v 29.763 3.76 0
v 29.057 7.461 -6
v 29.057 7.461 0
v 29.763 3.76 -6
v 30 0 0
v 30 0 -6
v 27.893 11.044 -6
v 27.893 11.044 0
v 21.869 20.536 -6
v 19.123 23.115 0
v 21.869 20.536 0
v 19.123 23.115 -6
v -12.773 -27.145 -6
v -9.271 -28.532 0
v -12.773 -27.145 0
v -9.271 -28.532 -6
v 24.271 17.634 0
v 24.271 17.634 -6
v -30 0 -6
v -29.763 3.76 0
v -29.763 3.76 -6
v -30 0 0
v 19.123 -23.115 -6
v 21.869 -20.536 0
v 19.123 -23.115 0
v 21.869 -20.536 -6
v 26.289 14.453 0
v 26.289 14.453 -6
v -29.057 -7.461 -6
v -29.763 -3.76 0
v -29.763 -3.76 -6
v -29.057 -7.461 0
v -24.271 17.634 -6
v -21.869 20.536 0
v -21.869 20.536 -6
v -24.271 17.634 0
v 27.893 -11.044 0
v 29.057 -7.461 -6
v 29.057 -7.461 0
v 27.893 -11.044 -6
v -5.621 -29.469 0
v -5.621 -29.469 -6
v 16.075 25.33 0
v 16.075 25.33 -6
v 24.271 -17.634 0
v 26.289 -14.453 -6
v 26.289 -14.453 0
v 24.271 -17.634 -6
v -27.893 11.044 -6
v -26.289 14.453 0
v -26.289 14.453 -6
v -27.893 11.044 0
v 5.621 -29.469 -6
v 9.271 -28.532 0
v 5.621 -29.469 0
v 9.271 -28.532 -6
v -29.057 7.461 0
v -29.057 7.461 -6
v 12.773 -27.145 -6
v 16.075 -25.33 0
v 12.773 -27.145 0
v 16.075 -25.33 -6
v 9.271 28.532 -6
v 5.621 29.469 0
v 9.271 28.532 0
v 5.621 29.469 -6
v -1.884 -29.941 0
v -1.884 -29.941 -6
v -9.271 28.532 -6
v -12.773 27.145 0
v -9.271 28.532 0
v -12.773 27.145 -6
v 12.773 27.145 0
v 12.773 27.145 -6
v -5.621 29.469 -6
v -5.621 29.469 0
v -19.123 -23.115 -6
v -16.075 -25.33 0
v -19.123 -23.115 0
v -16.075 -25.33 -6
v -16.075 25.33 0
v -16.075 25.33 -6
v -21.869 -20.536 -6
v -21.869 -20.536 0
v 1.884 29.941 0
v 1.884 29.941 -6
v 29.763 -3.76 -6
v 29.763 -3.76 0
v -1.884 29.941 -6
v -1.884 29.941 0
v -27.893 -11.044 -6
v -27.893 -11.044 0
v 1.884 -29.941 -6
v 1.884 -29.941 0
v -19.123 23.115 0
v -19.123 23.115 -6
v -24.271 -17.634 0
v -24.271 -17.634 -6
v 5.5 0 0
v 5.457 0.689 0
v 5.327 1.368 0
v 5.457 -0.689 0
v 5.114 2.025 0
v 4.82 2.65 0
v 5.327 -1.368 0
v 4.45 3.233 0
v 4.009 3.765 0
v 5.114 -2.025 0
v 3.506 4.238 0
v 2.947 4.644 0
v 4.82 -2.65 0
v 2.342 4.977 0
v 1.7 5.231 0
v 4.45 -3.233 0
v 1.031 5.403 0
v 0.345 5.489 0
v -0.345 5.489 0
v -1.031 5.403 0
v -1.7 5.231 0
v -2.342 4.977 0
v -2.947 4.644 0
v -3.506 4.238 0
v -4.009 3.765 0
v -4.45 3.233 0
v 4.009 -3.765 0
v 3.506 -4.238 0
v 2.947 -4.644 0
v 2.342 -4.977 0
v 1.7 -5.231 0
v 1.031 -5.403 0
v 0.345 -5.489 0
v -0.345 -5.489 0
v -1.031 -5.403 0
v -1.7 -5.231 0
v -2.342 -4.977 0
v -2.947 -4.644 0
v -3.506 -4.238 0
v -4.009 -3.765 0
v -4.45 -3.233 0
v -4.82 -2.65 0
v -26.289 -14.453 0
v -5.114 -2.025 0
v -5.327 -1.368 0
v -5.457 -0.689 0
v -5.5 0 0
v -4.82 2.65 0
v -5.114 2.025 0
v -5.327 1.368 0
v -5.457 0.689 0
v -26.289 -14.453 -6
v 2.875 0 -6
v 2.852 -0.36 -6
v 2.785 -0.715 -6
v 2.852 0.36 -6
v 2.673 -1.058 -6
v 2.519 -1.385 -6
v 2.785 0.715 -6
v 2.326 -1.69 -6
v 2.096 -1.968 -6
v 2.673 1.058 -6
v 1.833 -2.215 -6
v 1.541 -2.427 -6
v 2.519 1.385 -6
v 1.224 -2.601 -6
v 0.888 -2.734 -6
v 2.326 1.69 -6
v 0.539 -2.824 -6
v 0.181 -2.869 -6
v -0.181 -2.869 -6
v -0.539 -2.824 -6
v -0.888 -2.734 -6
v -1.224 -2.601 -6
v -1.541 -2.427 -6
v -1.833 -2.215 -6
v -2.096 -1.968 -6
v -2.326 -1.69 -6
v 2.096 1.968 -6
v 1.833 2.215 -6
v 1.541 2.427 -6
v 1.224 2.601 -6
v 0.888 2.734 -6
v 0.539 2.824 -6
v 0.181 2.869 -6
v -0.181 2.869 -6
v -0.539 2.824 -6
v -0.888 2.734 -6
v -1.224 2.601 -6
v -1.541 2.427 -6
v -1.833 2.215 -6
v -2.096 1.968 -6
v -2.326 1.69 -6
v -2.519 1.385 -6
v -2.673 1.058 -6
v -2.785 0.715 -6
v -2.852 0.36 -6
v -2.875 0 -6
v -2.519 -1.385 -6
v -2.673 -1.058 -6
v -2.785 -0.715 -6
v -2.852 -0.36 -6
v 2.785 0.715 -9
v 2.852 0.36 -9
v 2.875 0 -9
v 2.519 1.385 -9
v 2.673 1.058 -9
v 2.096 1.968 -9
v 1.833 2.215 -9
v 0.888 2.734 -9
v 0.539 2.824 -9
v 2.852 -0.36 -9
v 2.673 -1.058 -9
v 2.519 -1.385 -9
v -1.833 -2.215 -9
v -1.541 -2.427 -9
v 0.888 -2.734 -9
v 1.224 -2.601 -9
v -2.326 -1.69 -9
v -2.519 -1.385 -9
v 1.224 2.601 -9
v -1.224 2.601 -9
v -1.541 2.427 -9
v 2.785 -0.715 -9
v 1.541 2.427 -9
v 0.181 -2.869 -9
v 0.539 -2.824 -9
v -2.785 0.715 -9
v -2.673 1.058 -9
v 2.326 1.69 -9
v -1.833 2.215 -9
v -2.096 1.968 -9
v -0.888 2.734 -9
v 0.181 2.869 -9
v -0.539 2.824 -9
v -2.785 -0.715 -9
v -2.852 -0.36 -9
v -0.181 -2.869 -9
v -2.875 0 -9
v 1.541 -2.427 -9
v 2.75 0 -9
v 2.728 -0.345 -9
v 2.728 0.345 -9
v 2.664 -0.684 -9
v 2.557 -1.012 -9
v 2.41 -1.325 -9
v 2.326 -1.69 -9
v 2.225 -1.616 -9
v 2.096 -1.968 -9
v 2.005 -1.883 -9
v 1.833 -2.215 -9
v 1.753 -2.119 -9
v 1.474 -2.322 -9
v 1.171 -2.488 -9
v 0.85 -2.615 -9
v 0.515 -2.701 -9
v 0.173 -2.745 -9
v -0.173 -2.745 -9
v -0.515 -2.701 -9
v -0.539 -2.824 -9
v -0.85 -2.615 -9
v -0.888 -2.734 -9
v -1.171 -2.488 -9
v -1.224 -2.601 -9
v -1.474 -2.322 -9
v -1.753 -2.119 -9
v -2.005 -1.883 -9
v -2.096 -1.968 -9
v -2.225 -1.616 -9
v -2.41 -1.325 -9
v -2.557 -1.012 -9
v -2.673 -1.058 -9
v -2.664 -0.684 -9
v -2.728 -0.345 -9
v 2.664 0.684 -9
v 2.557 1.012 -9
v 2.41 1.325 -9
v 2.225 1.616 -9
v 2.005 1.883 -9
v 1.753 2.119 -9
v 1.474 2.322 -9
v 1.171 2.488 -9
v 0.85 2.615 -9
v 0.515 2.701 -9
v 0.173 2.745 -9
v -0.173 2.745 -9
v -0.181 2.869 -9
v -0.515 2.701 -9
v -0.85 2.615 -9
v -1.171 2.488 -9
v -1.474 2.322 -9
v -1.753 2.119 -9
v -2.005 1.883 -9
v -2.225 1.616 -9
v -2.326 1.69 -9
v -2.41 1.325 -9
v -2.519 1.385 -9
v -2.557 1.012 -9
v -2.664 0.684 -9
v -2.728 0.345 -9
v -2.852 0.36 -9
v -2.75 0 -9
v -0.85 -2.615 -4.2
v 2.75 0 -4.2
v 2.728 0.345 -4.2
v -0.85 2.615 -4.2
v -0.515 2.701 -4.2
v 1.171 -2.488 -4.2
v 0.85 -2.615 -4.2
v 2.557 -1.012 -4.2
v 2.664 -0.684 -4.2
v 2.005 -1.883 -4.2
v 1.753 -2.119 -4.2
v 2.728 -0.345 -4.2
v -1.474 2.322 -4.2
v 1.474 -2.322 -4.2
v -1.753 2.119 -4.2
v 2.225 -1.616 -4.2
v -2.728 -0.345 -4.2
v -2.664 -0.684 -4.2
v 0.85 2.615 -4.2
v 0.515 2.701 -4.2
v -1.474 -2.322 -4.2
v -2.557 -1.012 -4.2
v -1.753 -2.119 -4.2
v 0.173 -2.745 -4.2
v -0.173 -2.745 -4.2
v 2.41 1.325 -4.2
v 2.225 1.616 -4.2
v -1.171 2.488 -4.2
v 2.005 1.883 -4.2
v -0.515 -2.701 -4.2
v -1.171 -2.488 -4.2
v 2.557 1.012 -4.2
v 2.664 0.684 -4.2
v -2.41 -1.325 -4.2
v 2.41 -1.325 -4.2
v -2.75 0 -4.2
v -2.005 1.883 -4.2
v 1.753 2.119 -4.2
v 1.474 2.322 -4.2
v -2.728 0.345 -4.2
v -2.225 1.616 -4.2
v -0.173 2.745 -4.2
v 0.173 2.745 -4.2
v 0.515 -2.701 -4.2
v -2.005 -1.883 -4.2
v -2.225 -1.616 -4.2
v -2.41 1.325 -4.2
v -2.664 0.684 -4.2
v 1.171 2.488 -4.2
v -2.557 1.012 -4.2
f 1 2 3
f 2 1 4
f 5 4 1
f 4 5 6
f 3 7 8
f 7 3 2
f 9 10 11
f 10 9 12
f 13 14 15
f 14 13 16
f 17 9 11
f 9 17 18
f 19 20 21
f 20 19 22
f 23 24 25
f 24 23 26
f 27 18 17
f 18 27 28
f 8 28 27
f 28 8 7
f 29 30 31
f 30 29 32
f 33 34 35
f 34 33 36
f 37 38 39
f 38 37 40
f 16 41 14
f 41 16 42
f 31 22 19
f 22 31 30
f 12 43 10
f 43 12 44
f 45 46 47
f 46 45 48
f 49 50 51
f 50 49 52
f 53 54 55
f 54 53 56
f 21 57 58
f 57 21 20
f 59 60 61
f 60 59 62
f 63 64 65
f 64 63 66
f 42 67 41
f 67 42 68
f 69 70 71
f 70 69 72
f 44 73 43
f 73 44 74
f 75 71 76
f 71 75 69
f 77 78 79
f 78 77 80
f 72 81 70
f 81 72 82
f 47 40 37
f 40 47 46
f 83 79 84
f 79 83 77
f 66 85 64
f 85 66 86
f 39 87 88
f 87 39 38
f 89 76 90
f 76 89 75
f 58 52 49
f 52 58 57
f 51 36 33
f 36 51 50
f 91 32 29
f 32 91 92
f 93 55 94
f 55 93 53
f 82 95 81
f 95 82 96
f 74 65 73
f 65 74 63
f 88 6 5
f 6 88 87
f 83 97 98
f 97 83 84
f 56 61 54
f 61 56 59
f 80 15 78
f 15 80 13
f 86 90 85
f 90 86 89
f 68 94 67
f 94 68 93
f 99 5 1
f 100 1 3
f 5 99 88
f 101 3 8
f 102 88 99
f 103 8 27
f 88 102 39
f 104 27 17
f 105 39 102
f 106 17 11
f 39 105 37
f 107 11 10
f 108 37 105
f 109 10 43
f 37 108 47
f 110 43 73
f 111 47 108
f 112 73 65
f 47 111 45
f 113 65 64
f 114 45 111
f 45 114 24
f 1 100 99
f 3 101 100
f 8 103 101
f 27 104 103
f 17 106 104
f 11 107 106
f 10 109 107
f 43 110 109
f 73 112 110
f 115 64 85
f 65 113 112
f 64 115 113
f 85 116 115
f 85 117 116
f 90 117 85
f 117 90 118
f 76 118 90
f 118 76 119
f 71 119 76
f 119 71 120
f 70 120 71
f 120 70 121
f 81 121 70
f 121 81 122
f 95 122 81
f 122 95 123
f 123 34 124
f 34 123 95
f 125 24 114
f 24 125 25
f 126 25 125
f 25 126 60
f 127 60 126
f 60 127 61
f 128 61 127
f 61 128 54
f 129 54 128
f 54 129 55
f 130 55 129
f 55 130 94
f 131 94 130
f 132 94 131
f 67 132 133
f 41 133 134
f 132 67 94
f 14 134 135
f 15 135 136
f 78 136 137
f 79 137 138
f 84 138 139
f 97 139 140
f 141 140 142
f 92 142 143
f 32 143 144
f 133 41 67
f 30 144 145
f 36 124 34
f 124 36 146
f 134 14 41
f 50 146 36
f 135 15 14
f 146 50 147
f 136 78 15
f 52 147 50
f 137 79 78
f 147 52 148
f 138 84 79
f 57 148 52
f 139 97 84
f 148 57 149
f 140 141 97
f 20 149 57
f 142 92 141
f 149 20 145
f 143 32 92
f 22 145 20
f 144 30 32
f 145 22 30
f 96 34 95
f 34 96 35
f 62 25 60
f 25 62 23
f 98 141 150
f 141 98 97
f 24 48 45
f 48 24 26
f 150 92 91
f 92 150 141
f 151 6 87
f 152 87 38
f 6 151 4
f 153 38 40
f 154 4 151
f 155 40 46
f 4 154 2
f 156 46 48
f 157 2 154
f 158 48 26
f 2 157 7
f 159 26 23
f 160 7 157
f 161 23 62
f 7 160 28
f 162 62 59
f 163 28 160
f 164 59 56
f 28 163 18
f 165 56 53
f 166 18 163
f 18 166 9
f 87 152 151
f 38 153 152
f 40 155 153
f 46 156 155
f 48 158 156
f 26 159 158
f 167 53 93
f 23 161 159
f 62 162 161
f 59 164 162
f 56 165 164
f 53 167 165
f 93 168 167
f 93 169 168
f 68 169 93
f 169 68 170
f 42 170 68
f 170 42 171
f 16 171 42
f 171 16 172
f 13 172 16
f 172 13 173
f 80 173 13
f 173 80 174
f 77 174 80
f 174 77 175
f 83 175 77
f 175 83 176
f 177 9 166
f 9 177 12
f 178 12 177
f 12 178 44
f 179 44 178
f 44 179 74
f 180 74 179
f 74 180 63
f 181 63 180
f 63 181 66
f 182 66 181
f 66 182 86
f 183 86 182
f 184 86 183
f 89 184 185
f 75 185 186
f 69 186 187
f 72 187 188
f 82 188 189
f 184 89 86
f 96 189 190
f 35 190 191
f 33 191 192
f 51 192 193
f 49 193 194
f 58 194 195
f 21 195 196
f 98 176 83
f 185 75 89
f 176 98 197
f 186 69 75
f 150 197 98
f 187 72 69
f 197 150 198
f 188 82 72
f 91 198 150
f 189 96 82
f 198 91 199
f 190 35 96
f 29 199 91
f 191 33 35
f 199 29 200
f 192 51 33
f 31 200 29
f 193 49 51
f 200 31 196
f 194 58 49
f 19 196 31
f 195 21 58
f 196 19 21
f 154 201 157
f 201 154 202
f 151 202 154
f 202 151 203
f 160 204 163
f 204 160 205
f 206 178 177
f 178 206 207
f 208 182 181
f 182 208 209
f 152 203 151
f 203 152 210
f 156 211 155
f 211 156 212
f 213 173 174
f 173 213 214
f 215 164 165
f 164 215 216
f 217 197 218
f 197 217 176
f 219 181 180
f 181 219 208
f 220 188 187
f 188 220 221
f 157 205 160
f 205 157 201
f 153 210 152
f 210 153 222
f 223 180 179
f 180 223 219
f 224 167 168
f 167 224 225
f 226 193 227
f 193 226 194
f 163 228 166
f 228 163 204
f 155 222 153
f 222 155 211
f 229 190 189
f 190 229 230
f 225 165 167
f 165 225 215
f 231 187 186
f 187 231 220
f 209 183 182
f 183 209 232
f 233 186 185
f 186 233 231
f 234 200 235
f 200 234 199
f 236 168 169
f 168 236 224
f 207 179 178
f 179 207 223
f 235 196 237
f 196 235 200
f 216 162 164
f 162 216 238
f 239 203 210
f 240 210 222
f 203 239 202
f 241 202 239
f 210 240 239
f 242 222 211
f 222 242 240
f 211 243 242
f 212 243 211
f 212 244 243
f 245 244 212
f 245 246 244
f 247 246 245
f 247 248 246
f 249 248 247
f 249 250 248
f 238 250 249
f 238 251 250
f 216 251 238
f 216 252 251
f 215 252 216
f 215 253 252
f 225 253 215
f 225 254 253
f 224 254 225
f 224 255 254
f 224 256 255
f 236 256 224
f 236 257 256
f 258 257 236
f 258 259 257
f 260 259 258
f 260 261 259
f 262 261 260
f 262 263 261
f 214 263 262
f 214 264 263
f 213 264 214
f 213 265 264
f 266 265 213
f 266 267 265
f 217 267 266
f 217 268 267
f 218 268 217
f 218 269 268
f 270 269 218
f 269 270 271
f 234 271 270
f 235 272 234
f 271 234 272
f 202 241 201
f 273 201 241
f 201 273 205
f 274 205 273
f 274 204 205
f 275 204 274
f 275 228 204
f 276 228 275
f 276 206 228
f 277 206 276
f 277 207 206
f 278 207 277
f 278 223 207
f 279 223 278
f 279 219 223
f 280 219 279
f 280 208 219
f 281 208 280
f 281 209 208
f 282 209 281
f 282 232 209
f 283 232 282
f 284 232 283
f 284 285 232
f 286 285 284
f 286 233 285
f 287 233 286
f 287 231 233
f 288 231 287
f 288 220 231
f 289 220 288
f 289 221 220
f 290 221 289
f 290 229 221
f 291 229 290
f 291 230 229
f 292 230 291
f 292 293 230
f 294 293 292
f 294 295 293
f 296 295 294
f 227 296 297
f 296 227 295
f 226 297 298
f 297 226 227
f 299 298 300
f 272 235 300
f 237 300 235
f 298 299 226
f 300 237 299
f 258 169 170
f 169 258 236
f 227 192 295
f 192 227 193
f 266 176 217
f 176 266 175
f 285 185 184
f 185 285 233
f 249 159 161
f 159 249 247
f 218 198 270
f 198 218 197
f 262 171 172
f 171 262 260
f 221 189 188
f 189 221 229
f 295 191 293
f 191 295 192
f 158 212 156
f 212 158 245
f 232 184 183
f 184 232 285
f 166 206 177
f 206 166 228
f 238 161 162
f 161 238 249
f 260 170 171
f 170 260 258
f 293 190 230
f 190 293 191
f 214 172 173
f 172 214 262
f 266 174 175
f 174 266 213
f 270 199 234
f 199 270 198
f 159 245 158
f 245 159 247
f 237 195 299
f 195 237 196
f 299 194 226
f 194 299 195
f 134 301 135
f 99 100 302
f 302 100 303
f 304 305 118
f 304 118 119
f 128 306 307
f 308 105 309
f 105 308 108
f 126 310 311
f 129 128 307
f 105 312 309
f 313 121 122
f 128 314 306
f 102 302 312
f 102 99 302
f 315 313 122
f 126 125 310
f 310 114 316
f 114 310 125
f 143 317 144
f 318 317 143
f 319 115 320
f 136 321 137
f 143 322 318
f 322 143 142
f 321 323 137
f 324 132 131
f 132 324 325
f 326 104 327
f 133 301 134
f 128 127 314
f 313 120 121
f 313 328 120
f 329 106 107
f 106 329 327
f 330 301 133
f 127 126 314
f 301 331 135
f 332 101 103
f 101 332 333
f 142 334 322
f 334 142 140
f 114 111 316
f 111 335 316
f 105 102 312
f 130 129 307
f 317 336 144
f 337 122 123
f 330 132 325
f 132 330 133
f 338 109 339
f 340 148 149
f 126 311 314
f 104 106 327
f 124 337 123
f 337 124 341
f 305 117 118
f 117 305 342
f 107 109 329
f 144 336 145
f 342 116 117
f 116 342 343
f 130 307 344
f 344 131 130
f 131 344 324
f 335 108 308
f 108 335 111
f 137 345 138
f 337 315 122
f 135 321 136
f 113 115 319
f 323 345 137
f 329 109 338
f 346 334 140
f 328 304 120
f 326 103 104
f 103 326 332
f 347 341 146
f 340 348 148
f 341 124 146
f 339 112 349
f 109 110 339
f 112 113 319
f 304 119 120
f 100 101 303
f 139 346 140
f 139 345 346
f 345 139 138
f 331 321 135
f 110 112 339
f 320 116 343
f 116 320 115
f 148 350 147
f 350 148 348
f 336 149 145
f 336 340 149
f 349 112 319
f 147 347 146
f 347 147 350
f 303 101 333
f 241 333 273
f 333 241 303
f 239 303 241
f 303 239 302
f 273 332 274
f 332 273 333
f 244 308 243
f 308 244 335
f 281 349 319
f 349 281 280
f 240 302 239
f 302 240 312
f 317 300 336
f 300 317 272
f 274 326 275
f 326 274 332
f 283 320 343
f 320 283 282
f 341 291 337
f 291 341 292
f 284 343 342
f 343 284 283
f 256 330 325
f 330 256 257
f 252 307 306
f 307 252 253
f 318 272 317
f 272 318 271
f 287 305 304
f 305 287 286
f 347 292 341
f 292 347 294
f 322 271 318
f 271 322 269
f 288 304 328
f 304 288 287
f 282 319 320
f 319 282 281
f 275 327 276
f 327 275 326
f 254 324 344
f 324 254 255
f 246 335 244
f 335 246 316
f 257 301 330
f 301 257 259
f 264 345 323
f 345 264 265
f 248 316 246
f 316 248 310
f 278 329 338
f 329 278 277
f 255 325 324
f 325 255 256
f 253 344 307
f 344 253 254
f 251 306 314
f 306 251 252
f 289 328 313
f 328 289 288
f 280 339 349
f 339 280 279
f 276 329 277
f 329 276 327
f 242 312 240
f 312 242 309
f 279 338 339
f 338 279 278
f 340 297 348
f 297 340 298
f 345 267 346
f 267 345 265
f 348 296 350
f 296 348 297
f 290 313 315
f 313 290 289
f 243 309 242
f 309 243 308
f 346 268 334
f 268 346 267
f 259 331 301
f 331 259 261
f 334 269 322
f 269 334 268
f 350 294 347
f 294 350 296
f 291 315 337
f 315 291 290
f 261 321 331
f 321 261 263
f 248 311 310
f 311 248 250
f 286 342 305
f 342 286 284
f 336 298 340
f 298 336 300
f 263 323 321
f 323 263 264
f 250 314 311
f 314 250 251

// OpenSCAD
$fn = 50;

difference() {
	union() {
		translate(v = [0, 0, -6.0]) {
			cylinder(h = 6, r = 30.0);
		}
		#translate(v = [0, 0, -9.0]) {
			cylinder(h = 9, r = 2.875);
		}
	}
	union() {
		translate(v = [0, 0, 0]) {
			rotate(a = [0, 0, 0]) {
				difference() {
					union() {
						translate(v = [0, 0, -9.0]) {
							cylinder(h = 9, r = 2.25);
						}
						translate(v = [0, 0, -4.2]) {
							cylinder(h = 4.2, r1 = 2.75, r2 = 5.5);
						}
						translate(v = [0, 0, -9.0]) {
							cylinder(h = 9, r = 2.75);
						}
						translate(v = [0, 0, -9.0]) {
							cylinder(h = 9, r = 2.25);
						}
					}
					union();
				}
			}
		}
	}
}
